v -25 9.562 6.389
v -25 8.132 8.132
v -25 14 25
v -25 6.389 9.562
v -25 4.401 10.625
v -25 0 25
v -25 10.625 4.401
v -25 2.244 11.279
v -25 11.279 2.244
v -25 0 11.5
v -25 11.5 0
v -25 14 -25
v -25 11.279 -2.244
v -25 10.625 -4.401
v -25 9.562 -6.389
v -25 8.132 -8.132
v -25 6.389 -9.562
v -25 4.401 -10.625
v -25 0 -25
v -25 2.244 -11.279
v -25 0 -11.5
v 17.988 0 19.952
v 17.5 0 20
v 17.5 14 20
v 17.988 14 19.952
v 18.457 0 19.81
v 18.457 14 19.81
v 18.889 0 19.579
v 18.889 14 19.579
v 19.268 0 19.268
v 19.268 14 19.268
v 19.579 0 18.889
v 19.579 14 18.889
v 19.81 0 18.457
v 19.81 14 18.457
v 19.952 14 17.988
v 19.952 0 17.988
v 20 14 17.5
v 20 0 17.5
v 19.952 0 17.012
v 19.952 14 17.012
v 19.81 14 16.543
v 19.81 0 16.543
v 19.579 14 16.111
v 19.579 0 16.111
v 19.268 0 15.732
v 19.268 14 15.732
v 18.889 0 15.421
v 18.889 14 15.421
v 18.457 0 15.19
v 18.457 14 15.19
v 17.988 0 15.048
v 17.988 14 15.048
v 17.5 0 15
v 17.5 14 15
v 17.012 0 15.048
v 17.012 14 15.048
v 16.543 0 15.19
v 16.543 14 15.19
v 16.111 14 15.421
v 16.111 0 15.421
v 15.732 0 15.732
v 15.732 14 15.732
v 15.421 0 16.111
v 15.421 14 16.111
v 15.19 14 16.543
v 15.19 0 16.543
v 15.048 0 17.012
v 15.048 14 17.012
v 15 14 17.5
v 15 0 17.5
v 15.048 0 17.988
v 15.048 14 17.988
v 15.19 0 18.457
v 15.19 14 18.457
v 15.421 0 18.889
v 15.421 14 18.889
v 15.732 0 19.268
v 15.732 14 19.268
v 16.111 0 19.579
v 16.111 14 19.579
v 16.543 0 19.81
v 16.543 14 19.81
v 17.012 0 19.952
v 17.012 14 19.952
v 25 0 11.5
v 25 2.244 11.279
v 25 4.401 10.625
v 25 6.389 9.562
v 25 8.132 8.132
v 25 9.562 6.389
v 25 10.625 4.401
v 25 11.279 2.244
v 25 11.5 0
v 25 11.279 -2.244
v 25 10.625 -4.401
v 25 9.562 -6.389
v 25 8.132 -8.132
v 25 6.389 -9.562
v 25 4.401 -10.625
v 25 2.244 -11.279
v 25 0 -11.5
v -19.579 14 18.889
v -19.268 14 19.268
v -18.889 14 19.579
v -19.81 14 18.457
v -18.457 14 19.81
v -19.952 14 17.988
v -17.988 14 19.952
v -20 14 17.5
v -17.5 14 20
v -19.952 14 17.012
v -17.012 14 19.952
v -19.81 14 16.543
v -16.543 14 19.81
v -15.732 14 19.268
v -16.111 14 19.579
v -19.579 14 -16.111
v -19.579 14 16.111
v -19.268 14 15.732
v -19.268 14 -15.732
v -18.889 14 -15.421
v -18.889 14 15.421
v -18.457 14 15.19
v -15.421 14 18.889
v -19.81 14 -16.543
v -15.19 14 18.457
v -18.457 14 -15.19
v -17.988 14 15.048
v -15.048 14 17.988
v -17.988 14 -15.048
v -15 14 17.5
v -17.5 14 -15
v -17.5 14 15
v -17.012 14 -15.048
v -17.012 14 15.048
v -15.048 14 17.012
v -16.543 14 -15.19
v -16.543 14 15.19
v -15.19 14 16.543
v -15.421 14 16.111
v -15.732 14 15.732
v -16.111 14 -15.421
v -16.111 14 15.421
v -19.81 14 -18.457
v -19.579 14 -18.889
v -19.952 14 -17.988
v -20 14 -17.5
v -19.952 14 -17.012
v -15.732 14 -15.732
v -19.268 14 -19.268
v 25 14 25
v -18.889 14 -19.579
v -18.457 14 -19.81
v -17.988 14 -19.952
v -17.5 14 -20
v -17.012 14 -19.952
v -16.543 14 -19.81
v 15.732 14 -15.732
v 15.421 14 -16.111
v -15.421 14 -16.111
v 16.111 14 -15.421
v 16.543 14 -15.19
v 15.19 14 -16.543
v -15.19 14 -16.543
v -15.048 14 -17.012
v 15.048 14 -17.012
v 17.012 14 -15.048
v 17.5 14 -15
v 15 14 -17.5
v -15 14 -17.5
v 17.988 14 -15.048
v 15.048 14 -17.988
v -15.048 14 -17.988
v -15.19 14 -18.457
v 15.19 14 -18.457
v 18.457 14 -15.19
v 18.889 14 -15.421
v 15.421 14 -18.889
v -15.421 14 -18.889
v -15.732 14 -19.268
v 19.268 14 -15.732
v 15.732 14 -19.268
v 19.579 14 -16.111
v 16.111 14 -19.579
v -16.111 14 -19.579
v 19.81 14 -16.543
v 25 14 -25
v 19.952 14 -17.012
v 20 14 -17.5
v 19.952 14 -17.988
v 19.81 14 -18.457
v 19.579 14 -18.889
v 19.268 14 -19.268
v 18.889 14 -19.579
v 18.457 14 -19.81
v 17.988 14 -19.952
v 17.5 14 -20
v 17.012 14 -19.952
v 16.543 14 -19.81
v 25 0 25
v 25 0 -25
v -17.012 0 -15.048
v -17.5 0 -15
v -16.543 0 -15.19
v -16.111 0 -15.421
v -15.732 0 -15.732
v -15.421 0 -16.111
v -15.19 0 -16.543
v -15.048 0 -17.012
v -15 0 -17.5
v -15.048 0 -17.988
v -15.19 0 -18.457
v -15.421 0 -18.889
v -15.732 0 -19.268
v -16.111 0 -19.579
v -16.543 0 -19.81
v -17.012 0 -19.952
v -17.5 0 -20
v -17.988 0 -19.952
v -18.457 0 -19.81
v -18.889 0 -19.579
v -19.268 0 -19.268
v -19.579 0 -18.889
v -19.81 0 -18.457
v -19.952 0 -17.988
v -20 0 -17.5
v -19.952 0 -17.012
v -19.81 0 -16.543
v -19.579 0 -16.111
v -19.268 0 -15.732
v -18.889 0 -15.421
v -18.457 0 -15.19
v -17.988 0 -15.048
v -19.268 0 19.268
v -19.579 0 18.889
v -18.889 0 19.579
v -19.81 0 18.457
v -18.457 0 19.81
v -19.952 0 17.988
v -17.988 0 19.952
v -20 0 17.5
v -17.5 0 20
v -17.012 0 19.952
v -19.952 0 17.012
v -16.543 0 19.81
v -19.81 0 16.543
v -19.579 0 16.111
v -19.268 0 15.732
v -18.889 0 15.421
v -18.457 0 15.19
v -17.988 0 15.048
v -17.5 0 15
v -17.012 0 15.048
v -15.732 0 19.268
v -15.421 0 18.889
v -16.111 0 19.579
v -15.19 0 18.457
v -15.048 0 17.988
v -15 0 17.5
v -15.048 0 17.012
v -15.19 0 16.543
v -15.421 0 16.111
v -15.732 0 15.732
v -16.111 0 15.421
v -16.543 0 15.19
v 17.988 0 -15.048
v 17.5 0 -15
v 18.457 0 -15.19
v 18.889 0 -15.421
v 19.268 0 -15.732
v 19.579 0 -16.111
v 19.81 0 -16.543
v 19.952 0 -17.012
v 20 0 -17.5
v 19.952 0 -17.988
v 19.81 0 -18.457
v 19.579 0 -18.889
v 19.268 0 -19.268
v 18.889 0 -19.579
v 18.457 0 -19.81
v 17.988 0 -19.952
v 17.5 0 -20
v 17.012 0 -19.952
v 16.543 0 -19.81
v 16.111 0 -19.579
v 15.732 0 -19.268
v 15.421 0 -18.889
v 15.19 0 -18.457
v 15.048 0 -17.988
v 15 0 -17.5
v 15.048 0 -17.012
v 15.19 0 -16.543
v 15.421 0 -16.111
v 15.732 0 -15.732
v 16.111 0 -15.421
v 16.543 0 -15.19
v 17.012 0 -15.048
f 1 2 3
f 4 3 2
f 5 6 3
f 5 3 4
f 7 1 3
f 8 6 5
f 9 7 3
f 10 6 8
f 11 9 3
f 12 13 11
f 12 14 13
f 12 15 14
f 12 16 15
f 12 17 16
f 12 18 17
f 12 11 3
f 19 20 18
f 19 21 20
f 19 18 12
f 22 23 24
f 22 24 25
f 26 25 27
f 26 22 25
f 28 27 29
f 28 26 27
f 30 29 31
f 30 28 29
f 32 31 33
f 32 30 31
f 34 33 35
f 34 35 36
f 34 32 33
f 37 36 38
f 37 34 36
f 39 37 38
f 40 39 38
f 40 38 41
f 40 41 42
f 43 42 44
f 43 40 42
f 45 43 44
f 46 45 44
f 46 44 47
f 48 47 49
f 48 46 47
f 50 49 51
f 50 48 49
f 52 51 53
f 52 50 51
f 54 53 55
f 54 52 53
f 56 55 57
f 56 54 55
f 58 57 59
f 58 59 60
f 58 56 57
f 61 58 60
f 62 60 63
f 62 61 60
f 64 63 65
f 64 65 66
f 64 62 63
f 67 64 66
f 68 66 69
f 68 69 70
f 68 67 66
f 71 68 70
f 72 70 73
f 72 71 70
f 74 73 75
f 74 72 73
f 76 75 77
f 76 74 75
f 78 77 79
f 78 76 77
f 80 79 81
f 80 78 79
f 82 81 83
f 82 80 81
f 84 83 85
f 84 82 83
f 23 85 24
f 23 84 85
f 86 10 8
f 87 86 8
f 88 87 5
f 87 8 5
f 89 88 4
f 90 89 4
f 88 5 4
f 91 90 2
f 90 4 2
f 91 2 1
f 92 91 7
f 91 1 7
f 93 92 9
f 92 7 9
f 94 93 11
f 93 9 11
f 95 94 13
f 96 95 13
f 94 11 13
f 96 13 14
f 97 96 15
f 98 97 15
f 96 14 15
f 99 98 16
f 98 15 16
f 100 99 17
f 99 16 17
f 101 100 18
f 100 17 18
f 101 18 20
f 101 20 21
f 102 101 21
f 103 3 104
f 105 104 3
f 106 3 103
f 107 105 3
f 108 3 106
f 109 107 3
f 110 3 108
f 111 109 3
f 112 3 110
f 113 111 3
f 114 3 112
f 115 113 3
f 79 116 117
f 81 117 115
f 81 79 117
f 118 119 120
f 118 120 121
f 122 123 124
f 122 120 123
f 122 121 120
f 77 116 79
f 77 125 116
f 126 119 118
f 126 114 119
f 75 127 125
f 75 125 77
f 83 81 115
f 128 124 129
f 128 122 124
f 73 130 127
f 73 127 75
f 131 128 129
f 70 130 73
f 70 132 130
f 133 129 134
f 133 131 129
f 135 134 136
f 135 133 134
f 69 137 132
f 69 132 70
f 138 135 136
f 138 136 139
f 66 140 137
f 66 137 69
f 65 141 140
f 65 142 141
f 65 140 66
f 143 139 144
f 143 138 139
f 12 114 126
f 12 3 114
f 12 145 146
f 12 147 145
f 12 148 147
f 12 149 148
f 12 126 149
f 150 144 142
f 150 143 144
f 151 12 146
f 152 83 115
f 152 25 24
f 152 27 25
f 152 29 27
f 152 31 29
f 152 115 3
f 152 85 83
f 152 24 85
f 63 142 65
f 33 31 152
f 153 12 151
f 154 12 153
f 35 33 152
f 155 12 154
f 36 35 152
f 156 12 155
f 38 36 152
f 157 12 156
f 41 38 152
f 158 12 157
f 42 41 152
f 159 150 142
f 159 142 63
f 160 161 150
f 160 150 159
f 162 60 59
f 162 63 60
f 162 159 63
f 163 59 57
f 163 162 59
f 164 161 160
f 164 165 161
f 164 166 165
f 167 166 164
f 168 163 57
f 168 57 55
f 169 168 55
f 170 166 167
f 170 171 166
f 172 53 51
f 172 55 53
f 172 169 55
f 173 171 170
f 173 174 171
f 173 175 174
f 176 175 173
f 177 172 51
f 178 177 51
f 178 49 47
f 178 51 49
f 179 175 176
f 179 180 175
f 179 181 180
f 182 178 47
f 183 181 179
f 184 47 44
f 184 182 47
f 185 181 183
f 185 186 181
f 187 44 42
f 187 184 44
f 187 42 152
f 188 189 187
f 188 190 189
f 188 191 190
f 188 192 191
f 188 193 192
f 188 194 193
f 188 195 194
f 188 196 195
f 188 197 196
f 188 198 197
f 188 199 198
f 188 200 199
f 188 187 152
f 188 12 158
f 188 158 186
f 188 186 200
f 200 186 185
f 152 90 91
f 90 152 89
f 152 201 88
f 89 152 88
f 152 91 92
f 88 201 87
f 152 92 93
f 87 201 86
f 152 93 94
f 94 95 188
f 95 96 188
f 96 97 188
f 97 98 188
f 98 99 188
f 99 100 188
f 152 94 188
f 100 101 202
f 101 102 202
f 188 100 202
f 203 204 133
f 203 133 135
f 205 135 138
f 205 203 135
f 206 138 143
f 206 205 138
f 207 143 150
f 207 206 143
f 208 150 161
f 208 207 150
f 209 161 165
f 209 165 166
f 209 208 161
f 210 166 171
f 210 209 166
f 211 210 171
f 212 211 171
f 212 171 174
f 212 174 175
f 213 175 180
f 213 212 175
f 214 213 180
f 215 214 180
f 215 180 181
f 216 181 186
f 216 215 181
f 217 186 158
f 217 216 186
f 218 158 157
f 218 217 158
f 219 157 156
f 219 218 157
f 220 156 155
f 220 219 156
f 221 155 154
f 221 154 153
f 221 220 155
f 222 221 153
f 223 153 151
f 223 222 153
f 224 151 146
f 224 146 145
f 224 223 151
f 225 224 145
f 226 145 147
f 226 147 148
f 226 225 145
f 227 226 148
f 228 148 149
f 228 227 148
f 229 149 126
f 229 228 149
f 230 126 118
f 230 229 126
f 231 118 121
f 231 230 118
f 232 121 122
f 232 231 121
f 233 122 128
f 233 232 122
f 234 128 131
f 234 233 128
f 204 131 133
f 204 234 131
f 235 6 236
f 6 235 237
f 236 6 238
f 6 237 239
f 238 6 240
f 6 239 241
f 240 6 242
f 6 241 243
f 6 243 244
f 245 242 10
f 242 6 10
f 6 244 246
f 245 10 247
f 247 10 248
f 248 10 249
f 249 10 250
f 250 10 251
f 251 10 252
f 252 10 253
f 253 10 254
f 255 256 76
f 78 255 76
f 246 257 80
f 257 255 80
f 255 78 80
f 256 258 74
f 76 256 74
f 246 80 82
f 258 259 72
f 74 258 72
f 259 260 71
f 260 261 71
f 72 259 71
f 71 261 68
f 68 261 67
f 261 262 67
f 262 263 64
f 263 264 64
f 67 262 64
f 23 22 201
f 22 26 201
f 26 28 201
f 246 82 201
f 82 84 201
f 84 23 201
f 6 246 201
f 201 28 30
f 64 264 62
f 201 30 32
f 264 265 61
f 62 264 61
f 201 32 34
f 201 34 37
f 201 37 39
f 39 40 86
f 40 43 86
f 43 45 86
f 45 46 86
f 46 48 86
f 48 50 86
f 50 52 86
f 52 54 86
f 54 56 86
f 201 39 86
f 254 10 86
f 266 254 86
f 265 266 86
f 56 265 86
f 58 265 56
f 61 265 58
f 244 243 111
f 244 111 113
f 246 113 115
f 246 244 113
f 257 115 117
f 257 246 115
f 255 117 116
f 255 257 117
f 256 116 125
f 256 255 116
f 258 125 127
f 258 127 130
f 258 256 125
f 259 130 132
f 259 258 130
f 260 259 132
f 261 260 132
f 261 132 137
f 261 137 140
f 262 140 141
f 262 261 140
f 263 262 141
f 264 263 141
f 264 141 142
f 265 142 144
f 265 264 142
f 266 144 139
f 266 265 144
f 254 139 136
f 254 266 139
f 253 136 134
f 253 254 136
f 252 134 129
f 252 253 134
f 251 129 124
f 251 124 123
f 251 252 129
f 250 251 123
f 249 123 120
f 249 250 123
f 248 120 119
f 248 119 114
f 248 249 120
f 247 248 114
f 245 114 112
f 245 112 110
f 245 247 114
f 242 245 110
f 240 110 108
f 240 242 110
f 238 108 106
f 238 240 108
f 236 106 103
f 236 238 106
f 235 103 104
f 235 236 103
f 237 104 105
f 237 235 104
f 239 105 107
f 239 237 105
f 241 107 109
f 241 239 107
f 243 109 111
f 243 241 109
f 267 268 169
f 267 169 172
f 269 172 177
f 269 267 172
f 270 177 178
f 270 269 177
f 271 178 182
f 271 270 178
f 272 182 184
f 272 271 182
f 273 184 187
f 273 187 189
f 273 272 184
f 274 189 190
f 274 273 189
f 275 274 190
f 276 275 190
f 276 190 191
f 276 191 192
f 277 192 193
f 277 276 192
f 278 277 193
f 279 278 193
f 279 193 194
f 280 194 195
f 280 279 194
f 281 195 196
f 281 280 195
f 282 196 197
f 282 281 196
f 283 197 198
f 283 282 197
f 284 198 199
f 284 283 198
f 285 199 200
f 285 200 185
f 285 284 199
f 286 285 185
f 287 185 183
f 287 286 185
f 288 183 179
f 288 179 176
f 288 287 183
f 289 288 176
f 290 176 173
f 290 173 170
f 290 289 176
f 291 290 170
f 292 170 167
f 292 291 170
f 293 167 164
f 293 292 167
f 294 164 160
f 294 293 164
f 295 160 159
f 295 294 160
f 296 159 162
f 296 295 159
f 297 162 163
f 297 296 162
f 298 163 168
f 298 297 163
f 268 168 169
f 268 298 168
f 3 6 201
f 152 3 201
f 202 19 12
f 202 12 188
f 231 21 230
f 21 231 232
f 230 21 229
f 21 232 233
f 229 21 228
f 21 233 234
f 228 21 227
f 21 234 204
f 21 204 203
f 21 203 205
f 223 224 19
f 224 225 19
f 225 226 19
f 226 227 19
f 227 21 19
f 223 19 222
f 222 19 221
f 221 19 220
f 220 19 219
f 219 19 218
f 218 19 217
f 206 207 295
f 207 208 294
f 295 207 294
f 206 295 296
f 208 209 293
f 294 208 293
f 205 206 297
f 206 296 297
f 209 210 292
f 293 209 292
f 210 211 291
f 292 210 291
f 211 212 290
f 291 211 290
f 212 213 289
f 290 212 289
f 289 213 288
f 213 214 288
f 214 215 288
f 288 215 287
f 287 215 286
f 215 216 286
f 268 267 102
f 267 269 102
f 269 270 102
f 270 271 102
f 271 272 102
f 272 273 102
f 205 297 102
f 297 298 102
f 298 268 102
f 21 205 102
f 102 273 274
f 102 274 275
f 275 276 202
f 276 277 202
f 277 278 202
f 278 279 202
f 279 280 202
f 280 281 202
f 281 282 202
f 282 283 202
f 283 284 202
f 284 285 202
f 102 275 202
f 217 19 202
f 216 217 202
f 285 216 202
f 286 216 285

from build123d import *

# Parameters (mm, degrees)
SKETCH_1_W          = 50
SKETCH_1_H          = 50
SKETCH_1_R          = 2.5
EXTRUDE_1_DEPTH     = 14
SKETCH_2_R          = 11.5
CUT_EXTRUDE_1_DEPTH = 58.628118137


with BuildPart() as part:
    # 草图1 → 凸台-拉伸1 (new body)
    with BuildSketch(Plane(origin=(0, 0, 0), x_dir=(1, 0, 0), z_dir=(0, 1, 0))):
        Rectangle(SKETCH_1_W, SKETCH_1_H)
        with Locations(Location((-17.5, 17.5, 0), (0, 0, 270))):
            Circle(SKETCH_1_R, mode=Mode.SUBTRACT)
        with Locations(Location((-17.5, -17.5, 0), (0, 0, 270))):
            Circle(SKETCH_1_R, mode=Mode.SUBTRACT)
        with Locations(Location((17.5, 17.5, 0), (0, 0, 270))):
            Circle(SKETCH_1_R, mode=Mode.SUBTRACT)
        with Locations(Location((17.5, -17.5, 0), (0, 0, 270))):
            Circle(SKETCH_1_R, mode=Mode.SUBTRACT)
    extrude(amount=EXTRUDE_1_DEPTH)

    # 草图2 → 切除-拉伸1 (cut, through all)
    with BuildSketch(Plane.ZY.offset(25)):
        Circle(SKETCH_2_R)
    extrude(amount=-CUT_EXTRUDE_1_DEPTH, mode=Mode.SUBTRACT)


solid = part.part
